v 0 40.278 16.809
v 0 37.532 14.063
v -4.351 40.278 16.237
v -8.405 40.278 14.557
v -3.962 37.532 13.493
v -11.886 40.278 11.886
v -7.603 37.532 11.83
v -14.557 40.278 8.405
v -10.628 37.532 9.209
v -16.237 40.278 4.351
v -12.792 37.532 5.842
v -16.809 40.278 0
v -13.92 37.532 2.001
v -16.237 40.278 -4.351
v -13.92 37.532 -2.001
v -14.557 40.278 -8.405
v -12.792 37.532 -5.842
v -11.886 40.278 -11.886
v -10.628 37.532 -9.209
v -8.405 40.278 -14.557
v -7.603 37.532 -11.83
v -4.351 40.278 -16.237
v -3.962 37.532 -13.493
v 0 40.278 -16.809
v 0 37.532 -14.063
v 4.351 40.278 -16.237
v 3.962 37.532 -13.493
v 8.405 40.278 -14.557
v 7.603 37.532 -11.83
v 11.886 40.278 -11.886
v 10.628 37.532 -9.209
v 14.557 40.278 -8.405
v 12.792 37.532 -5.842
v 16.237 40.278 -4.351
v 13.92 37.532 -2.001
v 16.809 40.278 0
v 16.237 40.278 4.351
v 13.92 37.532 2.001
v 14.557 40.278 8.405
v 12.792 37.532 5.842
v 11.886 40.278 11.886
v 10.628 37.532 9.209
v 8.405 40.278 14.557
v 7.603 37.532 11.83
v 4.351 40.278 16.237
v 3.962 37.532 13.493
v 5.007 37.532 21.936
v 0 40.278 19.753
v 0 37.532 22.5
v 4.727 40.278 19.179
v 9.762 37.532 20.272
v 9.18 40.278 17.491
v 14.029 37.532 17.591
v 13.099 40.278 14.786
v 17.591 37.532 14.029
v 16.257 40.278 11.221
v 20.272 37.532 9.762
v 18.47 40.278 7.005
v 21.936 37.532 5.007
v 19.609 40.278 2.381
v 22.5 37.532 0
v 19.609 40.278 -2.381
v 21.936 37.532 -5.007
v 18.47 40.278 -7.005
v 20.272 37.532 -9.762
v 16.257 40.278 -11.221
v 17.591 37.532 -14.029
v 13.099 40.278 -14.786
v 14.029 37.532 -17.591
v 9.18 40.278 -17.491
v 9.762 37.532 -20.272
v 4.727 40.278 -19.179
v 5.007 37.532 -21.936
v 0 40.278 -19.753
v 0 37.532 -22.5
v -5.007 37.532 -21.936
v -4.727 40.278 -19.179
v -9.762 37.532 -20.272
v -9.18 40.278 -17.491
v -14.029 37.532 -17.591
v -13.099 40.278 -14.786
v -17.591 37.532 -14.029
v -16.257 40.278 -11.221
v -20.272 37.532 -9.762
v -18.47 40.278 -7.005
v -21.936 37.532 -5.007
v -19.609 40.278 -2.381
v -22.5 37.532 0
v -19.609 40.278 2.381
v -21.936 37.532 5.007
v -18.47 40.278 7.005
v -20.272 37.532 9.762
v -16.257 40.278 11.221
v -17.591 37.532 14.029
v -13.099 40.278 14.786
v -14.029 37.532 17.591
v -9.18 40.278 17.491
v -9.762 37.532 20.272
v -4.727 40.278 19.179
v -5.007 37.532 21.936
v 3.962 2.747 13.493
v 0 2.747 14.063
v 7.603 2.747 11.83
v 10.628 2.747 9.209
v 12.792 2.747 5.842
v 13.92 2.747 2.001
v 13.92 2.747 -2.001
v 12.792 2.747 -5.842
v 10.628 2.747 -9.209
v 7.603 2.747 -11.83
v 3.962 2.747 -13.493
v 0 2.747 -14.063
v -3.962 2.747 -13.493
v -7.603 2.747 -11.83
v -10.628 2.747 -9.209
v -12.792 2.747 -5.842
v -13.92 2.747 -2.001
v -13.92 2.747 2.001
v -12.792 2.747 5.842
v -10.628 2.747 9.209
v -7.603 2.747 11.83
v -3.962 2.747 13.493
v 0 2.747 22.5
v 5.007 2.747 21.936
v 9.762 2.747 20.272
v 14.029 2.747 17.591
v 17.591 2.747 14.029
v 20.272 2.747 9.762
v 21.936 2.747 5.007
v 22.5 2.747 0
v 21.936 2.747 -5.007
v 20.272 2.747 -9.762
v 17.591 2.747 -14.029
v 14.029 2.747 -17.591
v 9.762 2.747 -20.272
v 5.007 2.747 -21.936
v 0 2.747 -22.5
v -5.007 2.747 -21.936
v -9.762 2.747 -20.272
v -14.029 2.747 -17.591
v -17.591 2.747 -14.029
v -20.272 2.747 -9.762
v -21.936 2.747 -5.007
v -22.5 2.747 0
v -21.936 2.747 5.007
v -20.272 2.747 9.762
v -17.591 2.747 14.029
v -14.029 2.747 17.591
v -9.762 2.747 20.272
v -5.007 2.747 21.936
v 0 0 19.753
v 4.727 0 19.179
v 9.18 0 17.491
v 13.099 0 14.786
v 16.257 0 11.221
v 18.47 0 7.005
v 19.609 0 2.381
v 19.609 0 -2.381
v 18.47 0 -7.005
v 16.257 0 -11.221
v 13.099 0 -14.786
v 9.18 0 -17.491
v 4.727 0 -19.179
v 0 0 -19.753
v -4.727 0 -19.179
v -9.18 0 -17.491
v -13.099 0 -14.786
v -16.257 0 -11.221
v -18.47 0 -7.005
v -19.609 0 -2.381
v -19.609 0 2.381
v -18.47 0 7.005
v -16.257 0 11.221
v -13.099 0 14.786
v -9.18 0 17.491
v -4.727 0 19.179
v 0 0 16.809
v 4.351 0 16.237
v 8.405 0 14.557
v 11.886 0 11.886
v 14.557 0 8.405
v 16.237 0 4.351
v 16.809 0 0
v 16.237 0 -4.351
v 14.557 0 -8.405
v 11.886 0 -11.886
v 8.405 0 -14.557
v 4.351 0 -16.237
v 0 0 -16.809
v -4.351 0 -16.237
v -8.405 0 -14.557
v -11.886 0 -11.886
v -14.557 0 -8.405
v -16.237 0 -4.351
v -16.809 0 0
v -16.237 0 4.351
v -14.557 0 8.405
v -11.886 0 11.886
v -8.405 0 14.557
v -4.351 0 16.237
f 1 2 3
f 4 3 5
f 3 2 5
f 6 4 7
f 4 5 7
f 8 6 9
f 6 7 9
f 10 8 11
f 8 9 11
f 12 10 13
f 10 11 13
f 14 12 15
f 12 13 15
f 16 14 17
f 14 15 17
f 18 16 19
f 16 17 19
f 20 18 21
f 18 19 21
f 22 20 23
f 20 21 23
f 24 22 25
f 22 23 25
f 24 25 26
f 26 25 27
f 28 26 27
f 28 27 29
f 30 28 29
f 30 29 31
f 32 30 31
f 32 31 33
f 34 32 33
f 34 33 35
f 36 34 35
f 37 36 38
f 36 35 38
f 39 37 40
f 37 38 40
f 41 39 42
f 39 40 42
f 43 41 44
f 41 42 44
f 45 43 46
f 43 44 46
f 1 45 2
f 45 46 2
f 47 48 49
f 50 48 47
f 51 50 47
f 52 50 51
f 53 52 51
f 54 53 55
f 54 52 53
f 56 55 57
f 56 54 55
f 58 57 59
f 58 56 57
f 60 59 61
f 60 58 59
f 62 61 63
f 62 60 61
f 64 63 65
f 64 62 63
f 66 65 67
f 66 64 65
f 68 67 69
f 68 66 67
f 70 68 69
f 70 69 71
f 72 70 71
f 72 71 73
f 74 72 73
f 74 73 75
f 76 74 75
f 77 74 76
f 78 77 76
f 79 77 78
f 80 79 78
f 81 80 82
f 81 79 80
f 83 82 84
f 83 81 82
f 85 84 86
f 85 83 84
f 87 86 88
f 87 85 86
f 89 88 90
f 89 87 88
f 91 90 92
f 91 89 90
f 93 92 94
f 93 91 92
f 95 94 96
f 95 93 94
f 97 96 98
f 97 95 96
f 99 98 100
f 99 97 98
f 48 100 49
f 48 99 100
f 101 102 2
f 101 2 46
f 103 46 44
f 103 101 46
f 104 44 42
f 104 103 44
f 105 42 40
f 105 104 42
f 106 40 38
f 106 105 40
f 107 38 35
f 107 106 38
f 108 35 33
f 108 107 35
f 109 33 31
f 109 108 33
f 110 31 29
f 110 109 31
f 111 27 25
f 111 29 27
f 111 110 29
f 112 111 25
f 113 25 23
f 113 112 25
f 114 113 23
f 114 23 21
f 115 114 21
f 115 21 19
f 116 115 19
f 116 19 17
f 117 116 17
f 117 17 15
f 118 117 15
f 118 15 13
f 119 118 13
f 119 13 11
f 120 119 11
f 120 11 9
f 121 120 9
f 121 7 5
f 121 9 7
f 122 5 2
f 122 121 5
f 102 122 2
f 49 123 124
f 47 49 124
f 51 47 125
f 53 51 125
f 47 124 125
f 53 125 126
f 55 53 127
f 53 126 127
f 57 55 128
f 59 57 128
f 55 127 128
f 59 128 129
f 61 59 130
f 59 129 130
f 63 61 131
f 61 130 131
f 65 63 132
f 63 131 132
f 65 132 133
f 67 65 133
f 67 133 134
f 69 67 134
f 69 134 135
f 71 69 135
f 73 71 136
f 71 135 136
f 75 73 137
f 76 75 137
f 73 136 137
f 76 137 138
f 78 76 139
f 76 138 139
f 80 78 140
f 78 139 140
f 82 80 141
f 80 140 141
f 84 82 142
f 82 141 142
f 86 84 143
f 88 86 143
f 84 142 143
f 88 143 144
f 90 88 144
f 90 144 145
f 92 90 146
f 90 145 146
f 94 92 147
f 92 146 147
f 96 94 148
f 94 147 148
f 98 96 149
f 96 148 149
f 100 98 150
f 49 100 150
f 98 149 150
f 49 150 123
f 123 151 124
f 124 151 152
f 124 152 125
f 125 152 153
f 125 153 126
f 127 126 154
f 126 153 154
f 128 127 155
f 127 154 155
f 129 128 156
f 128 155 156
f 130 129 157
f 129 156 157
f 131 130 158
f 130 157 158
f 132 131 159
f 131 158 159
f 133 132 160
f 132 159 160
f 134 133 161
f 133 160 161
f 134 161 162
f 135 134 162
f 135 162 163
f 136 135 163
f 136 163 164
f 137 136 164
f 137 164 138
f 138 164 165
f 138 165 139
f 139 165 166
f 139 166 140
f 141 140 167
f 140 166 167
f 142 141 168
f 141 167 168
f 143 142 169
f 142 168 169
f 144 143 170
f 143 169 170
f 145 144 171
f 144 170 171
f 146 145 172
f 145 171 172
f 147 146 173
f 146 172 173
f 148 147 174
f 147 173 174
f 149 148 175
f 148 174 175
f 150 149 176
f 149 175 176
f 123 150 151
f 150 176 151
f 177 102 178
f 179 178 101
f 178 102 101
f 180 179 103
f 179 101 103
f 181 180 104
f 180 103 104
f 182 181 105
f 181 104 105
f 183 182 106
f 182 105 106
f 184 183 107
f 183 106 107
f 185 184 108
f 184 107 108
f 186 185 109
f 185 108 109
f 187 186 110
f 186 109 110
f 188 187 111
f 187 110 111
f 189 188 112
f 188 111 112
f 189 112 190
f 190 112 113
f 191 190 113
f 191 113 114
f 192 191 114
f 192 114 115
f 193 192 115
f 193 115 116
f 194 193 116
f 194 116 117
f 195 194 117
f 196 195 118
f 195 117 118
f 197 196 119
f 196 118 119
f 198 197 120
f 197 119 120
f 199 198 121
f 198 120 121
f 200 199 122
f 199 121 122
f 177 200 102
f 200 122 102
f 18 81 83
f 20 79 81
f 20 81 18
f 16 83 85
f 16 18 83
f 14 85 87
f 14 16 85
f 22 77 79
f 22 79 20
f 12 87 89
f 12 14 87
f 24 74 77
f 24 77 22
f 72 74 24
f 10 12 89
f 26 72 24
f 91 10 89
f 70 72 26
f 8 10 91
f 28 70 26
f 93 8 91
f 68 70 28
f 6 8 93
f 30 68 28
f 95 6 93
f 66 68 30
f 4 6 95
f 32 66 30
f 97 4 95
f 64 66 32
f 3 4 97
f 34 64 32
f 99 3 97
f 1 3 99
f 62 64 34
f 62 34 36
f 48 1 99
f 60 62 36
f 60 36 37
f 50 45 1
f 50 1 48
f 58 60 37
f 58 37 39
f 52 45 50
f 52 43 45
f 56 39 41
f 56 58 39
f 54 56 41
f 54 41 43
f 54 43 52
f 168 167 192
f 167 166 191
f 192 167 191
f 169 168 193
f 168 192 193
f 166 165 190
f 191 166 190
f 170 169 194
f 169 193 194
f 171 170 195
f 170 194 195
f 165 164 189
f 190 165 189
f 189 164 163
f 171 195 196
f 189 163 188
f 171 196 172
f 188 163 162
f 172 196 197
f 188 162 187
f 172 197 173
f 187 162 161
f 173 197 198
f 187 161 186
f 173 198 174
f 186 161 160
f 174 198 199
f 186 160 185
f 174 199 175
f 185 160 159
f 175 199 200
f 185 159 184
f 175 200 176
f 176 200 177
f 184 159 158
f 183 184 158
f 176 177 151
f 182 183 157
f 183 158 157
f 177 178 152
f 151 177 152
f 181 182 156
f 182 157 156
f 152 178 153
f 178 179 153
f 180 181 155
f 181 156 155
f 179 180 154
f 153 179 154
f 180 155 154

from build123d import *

# Parameters (mm, degrees)
SKETCH1_R           = 22.5
BOSS_EXTRUDE1_DEPTH = 40.2782778
SKETCH2_R           = 14.06292986
CUT_EXTRUDE1_DEPTH  = 52.330689286
CHAMFER1_SIZE       = 2.746556927


with BuildPart() as part:
    # Sketch1 → Boss-Extrude1 (new body)
    with BuildSketch(Plane(origin=(0, 0, 0), x_dir=(1, 0, 0), z_dir=(0, 1, 0))):
        Circle(SKETCH1_R)
    extrude(amount=BOSS_EXTRUDE1_DEPTH)

    # Sketch2 → Cut-Extrude1 (cut, through all)
    with BuildSketch(Plane(origin=(0, 0, 0), x_dir=(1, 0, 0), z_dir=(0, 1, 0))):
        Circle(SKETCH2_R)
    extrude(amount=CUT_EXTRUDE1_DEPTH, mode=Mode.SUBTRACT)

    # Chamfer1
    chamfer1_edges = [part.edges().sort_by_distance(p)[0] for p in [
        (-14.06292986, 40.2782778, 0),
        (-14.06292986, 0, 0),
        (-22.5, 0, 0),
        (-22.5, 40.2782778, 0),
    ]]
    chamfer(chamfer1_edges, length=CHAMFER1_SIZE)


solid = part.part
